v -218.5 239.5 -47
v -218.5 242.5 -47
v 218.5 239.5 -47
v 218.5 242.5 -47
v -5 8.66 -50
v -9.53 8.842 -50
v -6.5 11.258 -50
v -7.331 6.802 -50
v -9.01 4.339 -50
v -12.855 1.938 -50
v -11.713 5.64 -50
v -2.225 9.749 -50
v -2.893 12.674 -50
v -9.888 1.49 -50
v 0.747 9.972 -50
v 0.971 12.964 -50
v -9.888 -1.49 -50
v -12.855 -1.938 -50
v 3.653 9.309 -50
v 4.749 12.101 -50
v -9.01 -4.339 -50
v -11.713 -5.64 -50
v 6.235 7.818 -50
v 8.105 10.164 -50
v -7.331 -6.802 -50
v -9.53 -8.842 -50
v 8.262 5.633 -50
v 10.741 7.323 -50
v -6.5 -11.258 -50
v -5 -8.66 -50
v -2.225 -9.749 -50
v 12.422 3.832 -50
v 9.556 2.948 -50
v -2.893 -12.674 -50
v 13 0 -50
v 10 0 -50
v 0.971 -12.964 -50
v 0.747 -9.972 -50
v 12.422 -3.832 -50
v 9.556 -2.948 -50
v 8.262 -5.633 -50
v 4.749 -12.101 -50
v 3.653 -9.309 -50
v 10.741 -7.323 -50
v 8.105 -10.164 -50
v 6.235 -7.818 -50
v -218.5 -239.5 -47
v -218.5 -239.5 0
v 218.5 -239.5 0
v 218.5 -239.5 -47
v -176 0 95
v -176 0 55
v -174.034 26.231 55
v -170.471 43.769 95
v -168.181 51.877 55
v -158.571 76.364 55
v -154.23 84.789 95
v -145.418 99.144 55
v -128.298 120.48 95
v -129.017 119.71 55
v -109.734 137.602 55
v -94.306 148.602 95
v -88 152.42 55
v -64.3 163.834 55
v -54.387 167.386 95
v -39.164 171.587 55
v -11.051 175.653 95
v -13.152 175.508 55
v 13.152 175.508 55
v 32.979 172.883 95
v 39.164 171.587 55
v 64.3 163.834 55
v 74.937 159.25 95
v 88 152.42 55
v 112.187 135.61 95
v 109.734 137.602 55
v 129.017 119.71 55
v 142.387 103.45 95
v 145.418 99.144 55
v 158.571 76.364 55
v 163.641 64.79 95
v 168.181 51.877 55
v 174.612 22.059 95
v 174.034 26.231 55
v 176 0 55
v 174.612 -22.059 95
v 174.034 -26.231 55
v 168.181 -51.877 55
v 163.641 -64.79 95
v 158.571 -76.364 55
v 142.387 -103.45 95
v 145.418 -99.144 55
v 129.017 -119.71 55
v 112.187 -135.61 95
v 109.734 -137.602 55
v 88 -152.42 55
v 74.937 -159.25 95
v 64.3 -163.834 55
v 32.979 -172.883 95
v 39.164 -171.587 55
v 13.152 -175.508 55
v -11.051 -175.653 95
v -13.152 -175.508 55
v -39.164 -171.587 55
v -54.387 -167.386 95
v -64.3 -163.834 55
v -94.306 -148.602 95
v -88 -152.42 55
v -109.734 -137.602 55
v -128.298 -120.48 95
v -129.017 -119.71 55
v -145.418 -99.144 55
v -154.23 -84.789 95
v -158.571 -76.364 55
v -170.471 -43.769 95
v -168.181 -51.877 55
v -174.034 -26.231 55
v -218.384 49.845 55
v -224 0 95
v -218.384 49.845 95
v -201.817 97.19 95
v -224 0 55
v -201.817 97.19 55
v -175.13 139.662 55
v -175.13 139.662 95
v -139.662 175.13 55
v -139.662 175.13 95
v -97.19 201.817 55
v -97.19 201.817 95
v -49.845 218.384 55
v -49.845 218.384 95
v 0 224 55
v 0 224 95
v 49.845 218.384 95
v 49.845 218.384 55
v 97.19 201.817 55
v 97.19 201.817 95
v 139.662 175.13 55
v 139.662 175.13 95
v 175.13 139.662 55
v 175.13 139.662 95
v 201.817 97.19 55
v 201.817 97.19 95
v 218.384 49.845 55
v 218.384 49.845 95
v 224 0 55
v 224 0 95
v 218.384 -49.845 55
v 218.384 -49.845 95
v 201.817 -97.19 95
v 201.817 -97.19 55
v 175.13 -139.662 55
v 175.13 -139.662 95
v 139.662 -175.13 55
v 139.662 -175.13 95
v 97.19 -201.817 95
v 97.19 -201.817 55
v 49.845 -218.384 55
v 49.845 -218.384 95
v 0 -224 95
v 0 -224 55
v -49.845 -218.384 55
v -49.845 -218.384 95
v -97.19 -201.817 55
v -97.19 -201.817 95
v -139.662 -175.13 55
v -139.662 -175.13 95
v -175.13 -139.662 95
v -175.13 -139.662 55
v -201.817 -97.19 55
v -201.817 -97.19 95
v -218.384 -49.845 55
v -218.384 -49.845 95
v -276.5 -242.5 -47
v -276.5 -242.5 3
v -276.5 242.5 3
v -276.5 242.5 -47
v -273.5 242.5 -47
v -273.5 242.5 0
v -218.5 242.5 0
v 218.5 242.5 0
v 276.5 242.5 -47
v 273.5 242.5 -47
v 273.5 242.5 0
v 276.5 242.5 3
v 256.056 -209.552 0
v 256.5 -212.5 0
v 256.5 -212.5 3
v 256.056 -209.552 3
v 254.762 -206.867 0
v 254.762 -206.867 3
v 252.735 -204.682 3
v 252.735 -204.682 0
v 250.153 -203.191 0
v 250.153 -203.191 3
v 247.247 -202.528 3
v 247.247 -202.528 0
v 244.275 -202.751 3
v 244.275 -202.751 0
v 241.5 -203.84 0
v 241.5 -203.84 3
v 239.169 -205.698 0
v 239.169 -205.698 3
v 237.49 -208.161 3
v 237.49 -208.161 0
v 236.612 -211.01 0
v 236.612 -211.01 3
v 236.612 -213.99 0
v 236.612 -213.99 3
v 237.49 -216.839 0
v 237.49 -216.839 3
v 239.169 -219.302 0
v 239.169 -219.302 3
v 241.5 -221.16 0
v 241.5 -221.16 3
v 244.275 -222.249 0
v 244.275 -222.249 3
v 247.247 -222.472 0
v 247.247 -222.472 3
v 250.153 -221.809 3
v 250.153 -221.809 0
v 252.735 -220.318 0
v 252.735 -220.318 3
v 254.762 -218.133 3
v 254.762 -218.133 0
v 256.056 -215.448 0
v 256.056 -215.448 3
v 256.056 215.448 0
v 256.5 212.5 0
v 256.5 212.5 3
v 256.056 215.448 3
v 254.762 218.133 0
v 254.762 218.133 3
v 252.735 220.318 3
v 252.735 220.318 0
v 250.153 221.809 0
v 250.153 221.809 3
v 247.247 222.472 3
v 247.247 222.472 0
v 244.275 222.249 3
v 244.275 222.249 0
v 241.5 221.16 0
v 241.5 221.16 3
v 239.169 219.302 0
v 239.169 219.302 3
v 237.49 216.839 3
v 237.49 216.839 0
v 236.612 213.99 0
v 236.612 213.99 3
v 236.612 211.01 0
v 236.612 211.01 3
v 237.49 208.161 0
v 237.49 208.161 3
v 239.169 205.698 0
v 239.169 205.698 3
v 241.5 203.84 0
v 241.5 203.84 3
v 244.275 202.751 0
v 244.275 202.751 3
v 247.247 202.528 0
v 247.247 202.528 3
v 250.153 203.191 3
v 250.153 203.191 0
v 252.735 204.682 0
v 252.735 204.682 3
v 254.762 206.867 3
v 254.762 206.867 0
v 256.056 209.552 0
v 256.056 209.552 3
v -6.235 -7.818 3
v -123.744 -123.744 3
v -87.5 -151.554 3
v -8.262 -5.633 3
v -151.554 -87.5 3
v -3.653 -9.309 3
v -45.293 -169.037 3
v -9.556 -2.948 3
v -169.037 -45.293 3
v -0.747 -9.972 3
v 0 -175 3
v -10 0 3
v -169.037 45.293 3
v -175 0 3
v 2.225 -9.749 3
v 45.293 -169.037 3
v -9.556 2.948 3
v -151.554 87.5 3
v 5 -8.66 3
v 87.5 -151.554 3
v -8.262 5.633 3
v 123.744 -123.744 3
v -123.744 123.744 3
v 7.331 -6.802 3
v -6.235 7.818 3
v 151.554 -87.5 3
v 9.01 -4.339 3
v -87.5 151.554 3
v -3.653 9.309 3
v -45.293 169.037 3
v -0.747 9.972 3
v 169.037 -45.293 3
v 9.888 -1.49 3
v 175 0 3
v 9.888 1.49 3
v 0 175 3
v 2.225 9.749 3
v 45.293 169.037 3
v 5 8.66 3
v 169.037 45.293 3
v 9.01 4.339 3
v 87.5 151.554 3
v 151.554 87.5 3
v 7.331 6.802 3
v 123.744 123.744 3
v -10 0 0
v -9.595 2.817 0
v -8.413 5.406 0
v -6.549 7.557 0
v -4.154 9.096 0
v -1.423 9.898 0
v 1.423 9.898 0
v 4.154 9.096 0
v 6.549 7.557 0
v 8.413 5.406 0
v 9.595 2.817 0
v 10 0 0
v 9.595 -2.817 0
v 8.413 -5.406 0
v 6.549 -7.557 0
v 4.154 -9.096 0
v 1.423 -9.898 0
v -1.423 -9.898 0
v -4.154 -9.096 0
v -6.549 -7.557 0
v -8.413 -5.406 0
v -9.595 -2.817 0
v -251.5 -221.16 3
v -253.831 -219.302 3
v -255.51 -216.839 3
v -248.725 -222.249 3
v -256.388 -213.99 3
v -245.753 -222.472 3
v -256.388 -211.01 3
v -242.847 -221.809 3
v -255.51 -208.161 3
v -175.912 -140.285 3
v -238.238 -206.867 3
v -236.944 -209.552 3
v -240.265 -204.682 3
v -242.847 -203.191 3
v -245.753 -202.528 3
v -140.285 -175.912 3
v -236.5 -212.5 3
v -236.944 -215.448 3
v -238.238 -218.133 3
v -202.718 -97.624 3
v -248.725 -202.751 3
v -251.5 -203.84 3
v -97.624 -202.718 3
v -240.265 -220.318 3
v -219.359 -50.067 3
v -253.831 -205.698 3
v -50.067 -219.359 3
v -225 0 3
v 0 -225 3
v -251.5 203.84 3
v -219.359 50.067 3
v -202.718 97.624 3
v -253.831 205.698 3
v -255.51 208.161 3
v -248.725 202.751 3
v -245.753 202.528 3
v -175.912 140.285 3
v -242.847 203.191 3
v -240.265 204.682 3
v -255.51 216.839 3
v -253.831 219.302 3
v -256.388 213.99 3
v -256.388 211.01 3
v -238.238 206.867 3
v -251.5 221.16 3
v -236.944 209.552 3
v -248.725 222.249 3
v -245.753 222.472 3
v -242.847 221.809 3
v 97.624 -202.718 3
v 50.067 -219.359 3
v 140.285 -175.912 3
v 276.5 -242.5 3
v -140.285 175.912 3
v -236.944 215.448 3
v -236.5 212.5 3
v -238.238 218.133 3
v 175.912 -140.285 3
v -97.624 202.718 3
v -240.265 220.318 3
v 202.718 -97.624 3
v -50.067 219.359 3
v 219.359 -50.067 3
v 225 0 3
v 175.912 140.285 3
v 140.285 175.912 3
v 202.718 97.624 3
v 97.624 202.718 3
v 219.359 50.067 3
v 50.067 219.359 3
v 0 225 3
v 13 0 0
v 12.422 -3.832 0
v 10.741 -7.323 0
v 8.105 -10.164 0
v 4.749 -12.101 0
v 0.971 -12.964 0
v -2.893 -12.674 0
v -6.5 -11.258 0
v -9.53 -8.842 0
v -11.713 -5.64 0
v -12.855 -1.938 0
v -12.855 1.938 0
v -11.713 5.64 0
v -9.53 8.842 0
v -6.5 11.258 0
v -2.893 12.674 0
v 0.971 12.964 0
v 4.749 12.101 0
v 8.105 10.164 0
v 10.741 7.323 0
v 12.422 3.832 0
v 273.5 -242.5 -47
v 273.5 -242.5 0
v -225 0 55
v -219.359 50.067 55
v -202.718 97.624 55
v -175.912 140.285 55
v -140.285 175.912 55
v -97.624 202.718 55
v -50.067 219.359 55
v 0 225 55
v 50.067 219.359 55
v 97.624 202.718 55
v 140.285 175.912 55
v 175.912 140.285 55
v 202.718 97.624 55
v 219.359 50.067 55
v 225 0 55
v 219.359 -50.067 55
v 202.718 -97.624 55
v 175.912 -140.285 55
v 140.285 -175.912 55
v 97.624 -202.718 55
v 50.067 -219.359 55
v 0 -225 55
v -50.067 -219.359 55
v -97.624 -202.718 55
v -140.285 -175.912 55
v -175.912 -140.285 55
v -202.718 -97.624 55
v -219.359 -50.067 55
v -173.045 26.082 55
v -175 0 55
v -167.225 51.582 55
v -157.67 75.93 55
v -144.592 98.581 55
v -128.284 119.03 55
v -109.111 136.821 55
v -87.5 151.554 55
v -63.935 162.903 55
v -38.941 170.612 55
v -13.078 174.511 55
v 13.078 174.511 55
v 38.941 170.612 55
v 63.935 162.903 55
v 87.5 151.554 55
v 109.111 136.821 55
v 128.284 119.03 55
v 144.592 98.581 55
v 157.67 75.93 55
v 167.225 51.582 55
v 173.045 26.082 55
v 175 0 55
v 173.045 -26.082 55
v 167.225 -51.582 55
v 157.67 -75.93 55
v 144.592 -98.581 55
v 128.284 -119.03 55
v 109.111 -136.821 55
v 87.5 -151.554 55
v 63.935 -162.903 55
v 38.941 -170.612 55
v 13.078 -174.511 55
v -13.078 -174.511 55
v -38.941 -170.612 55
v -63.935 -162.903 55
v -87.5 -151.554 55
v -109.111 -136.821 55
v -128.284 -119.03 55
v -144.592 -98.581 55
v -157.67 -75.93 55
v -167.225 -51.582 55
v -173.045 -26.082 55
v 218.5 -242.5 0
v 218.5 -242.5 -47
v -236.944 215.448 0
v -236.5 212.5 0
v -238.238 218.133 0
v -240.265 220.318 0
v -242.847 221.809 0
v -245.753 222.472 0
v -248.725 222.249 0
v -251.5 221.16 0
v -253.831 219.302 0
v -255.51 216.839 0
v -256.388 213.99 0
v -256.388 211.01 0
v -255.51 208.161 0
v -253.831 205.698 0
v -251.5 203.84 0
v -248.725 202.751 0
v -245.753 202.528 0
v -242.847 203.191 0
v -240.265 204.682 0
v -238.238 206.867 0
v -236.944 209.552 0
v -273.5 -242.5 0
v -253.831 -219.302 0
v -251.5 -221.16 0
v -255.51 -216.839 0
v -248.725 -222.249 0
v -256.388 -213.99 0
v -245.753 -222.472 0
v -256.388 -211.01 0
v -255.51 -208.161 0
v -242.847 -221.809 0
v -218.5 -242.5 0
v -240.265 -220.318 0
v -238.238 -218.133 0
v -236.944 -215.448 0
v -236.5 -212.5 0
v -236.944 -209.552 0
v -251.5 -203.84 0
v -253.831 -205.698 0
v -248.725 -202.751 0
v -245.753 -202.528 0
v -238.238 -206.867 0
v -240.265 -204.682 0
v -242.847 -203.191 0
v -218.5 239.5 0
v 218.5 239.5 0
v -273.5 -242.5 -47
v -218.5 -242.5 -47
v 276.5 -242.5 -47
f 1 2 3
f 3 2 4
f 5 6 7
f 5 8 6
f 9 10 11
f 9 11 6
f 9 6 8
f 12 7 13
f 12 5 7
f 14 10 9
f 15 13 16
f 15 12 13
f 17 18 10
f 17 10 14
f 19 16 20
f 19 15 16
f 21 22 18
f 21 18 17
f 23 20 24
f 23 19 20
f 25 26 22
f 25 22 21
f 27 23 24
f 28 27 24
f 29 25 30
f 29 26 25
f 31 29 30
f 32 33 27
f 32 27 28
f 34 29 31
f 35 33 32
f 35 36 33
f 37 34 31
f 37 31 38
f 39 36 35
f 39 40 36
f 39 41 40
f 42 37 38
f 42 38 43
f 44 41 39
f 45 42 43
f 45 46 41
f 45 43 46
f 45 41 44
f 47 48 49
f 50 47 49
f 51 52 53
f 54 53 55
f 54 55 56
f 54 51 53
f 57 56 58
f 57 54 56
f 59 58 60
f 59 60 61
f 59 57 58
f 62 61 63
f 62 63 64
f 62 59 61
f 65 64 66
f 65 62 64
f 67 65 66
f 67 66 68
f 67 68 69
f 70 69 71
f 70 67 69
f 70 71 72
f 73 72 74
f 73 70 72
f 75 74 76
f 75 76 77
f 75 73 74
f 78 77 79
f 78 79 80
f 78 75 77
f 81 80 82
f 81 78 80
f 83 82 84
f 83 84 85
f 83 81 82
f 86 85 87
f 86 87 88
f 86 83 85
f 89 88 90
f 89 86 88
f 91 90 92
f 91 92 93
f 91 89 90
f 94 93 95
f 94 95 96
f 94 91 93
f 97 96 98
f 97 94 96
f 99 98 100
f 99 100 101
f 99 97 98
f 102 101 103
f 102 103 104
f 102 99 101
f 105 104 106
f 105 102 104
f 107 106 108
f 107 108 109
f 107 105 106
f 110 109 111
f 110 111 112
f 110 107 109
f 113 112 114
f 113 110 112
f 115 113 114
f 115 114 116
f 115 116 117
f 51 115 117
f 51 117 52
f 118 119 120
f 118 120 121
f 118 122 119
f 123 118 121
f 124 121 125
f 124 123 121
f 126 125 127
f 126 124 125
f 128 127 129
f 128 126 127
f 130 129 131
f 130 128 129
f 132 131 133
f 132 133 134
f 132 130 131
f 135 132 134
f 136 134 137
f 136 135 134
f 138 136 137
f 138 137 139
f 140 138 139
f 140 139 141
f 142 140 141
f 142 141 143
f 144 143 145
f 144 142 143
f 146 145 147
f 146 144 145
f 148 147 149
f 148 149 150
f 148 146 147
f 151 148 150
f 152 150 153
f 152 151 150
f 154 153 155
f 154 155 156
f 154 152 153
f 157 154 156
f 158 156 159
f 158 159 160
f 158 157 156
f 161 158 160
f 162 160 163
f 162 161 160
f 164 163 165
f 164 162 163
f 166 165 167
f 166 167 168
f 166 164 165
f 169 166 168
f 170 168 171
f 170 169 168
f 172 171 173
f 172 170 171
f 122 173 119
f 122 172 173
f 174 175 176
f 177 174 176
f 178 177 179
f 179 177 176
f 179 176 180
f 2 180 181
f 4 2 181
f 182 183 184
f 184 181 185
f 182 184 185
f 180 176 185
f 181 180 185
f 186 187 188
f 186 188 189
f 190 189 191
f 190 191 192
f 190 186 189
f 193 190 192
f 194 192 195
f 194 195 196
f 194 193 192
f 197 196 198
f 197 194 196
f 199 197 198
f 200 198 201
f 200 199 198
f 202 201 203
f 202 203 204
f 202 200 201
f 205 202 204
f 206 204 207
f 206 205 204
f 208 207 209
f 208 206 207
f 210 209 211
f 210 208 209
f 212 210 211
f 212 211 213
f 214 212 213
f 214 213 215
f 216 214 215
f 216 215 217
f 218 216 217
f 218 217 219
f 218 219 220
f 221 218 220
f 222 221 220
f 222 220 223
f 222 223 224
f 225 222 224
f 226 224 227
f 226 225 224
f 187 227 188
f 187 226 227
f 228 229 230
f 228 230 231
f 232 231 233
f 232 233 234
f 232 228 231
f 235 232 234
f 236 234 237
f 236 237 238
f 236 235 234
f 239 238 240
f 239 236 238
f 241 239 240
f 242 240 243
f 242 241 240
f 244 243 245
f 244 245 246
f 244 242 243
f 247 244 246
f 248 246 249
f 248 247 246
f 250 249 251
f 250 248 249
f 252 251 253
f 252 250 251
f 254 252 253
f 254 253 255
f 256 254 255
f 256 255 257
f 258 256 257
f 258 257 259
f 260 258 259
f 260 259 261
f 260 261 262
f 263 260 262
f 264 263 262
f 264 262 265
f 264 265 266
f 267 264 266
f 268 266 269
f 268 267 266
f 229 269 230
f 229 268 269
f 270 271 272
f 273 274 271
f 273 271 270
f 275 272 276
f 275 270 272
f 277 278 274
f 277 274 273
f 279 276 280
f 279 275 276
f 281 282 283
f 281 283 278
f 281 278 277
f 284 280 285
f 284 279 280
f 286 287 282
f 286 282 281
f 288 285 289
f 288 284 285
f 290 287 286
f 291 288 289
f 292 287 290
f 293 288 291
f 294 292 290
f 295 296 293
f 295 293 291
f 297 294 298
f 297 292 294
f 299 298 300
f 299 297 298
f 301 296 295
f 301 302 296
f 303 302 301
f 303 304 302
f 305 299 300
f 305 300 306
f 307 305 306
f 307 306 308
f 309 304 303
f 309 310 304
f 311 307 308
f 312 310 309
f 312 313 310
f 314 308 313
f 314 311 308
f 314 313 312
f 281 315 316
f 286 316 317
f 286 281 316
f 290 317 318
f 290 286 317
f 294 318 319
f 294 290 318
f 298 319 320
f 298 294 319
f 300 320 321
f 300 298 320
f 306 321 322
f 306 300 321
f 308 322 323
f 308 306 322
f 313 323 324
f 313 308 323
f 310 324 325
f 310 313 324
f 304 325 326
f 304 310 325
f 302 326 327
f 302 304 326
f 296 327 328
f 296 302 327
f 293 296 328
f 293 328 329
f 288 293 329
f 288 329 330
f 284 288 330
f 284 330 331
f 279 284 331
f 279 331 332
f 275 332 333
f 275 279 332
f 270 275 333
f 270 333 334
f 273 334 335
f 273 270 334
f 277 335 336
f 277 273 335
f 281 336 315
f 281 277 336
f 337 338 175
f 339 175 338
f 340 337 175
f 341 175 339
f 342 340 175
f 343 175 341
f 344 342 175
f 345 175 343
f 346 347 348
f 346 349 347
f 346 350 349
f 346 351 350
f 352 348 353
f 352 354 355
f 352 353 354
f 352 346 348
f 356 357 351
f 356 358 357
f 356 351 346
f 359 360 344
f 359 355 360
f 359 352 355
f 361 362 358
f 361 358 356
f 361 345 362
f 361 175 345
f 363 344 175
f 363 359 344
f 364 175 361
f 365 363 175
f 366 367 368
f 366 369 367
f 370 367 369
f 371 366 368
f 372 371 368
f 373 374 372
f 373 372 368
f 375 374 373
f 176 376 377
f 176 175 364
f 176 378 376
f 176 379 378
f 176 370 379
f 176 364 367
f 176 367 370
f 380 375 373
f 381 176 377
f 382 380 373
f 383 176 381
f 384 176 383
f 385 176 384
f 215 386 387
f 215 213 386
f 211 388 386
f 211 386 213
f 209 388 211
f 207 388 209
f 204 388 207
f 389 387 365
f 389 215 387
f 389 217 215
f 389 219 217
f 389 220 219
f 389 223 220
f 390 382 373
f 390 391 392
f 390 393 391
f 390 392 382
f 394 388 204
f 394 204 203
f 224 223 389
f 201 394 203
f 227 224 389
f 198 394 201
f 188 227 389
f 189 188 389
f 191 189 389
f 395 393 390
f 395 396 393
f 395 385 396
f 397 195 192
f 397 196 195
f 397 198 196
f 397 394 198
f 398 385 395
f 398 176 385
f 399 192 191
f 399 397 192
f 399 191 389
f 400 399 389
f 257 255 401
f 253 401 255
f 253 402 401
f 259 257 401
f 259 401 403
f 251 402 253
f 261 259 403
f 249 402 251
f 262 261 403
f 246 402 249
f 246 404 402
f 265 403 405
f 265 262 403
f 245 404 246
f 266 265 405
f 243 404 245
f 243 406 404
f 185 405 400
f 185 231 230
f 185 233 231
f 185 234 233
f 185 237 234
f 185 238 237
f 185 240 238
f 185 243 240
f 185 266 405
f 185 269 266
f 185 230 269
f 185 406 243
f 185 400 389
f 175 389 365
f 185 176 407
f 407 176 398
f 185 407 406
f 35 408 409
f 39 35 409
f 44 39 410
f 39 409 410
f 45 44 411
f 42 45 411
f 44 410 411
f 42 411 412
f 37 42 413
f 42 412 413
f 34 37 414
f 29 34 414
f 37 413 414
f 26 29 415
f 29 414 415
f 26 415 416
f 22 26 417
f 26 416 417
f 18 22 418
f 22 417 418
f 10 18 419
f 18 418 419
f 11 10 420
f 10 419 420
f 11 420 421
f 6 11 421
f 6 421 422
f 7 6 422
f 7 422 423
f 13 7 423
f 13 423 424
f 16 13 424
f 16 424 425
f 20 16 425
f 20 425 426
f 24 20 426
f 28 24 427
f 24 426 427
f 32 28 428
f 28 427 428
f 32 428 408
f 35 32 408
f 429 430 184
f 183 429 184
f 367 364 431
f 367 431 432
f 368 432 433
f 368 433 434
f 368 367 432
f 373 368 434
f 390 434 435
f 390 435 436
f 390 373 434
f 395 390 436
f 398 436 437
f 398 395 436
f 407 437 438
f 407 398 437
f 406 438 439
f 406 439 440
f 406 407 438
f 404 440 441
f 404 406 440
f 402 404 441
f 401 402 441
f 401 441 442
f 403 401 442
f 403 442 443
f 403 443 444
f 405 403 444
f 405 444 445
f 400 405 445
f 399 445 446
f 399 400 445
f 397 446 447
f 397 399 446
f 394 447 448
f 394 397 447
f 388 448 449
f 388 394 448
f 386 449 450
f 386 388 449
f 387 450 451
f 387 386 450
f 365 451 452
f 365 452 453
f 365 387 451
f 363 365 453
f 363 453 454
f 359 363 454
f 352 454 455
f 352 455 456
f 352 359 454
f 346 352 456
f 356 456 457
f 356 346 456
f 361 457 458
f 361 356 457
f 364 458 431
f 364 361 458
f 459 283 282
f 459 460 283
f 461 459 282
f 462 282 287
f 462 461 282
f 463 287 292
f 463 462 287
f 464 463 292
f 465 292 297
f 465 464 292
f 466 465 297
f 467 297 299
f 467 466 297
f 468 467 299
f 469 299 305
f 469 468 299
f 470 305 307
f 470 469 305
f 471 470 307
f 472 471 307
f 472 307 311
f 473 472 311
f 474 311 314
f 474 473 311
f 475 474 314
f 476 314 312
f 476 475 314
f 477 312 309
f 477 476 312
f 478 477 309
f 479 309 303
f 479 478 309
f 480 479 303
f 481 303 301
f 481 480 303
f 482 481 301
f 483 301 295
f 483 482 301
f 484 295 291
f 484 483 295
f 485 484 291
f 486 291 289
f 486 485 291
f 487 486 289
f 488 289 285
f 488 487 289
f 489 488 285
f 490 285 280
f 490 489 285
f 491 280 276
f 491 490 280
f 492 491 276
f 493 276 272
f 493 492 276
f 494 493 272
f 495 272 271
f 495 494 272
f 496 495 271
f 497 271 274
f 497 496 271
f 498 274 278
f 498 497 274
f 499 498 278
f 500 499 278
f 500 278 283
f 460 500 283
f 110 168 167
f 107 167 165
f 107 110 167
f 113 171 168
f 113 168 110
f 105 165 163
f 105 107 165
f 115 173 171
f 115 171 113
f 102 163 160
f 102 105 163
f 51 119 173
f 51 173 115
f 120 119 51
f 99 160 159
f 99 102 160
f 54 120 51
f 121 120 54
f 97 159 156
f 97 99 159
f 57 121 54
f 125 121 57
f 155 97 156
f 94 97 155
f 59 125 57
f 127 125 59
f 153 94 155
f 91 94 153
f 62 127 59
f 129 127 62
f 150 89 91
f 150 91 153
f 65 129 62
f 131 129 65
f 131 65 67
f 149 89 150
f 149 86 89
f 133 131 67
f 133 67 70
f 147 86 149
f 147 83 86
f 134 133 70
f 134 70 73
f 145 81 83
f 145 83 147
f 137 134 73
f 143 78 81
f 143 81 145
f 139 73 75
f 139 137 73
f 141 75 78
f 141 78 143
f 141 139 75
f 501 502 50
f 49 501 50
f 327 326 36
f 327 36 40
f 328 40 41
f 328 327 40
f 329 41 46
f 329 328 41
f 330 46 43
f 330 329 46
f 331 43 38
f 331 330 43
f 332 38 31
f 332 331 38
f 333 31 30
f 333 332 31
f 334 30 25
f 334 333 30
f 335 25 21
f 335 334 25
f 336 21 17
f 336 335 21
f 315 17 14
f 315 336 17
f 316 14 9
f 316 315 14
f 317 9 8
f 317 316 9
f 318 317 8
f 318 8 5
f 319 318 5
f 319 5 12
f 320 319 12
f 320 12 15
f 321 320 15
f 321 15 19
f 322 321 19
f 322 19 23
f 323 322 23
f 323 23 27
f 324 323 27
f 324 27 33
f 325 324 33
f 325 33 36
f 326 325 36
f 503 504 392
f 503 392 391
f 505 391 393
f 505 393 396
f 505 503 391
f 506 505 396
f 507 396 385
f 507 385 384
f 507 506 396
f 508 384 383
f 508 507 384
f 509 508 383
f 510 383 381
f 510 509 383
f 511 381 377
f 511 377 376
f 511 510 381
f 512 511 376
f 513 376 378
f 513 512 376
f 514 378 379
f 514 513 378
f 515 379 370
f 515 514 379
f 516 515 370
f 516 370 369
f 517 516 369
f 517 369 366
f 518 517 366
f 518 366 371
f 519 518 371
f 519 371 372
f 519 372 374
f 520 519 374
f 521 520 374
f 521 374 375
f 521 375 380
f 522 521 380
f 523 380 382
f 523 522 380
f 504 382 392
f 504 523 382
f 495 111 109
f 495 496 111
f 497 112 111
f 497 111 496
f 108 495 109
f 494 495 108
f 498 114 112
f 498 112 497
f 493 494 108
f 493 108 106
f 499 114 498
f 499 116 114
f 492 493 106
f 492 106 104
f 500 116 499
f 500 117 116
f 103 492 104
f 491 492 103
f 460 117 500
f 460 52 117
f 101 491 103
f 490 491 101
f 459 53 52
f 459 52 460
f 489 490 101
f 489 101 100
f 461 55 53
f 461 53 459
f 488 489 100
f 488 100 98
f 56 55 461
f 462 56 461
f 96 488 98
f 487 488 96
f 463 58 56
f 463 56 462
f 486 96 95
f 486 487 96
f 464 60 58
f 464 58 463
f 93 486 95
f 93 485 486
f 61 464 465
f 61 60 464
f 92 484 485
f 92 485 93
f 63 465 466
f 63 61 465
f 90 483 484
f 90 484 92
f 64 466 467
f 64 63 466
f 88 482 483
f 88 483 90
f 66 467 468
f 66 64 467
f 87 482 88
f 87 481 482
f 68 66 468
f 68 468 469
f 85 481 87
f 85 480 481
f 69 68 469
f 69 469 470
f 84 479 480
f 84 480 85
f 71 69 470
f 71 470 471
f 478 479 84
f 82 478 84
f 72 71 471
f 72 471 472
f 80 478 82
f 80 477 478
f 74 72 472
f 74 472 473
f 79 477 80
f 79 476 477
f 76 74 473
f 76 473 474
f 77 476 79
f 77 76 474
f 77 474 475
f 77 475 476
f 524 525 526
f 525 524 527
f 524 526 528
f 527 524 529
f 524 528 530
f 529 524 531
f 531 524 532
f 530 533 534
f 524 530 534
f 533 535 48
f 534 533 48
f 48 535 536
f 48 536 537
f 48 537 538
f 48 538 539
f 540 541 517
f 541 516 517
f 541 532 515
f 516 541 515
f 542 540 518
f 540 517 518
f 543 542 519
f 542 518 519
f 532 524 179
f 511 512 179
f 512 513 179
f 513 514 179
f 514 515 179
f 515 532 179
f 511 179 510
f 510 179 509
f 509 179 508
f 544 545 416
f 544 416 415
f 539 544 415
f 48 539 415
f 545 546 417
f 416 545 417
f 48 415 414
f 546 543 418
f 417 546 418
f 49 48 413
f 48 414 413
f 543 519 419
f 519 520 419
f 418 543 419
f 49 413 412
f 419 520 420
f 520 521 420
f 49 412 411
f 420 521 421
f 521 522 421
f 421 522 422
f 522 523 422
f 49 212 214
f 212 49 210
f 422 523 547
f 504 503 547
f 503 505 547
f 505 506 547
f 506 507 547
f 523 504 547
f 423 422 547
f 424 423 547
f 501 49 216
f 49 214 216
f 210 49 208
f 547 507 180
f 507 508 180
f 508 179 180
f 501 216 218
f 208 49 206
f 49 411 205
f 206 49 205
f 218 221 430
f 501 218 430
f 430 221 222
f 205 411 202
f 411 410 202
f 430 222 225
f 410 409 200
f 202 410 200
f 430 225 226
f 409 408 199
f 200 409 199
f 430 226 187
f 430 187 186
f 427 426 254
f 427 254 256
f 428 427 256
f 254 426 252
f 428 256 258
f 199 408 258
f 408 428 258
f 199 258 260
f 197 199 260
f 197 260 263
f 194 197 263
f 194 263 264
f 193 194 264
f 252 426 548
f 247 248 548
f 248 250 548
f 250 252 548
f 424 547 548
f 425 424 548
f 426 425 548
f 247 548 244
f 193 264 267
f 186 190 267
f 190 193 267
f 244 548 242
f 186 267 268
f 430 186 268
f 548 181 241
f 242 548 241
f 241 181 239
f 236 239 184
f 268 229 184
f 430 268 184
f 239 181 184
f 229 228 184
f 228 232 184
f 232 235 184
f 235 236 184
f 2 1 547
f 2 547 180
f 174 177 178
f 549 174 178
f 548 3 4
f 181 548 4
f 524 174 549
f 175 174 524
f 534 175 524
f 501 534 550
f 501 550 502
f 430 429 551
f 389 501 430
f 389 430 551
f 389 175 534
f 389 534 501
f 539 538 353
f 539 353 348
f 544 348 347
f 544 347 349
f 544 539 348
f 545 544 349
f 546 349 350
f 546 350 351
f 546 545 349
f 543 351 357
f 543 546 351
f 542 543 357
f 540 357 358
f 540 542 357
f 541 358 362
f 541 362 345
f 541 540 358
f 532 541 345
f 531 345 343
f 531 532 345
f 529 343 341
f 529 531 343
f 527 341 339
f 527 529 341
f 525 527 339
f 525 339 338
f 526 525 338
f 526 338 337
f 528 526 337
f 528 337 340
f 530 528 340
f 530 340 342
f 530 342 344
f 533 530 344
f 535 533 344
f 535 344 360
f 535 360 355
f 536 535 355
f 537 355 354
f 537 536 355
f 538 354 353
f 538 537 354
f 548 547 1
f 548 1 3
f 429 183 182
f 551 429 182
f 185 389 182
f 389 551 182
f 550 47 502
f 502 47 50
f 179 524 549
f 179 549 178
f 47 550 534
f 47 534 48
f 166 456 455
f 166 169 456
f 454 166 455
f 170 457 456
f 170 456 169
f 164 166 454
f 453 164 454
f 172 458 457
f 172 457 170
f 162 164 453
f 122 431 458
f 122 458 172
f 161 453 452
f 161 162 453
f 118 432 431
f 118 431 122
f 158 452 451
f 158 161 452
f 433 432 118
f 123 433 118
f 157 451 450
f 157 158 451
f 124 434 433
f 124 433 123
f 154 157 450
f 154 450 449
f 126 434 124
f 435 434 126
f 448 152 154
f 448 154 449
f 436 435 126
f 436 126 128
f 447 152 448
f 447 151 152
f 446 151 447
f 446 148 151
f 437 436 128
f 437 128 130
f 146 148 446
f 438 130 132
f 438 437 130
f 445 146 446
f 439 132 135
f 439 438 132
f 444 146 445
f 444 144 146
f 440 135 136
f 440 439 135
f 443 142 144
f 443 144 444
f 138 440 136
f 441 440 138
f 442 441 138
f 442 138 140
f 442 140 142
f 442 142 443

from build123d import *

# Parameters (mm, degrees)
F2_W     = 553
F2_H     = 485
F2_R     = 10
F2_R_2   = 200
F3_DEPTH = 3
F4_W     = 3
F4_H     = 485
F4_W_2   = 437
F4_H_2   = 3
F5_DEPTH = 50
F6_R     = 13
F6_R_2   = 10
F7_DEPTH = 50


with BuildPart() as f1:
    # F0 (on Front) → F1 (revolve)
    with BuildSketch(Plane.XZ):
        Polygon((-225, 3), (-175, 3), (-175, 55), (-176, 55), (-176, 95), (-224, 95), (-224, 55), (-225, 55), align=None)
        Polygon((-10, 3), (-175, 3), (-225, 3), (-225, 0), (-10, 0), align=None)
    revolve(axis=Axis((0, 0, 187.921241), (0, 0, -1)))

    # F2 (on Top) → F3 (join)
    with BuildSketch(Plane.XY):
        Rectangle(F2_W, F2_H)
        with Locations((-246.5, -212.5)):
            Circle(F2_R, mode=Mode.SUBTRACT)
        with Locations((246.5, -212.5)):
            Circle(F2_R, mode=Mode.SUBTRACT)
        with Locations((-246.5, 212.5)):
            Circle(F2_R, mode=Mode.SUBTRACT)
        Circle(F2_R_2, mode=Mode.SUBTRACT)
        with Locations((246.5, 212.5)):
            Circle(F2_R, mode=Mode.SUBTRACT)
    extrude(amount=F3_DEPTH)

    # F4 (on face) → F5 (join)
    with BuildSketch(Plane.XY.offset(3)):
        with Locations((-275, 0)):
            Rectangle(F4_W, F4_H)
        with Locations((275, 0)):
            Rectangle(F4_W, F4_H)
        with Locations((0, -241)):
            Rectangle(F4_W_2, F4_H_2)
        with Locations((0, 241)):
            Rectangle(F4_W_2, F4_H_2)
    extrude(amount=-F5_DEPTH)

    # F6 (on face) → F7 (join)
    with BuildSketch(Plane(origin=(0, 0, 0), x_dir=(1, 0, 0), z_dir=(0, 0, -1))):
        Circle(F6_R)
        Circle(F6_R_2, mode=Mode.SUBTRACT)
    extrude(amount=F7_DEPTH)


solid = f1.part
